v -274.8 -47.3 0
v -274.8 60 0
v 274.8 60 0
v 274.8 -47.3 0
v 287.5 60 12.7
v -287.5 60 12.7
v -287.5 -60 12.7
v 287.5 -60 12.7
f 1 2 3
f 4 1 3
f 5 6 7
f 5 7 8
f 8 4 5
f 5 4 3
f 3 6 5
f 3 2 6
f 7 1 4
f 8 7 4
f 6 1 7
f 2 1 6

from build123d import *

# Parameters (mm, degrees)
SKETCH1_W           = 575
SKETCH1_H           = 120
BOSS_EXTRUDE1_DEPTH = 12.7
CHAMFER1_SIZE       = 12.7


with BuildPart() as part:
    # Sketch1 → Boss-Extrude1 (new body)
    with BuildSketch(Plane.XY):
        Rectangle(SKETCH1_W, SKETCH1_H)
    extrude(amount=BOSS_EXTRUDE1_DEPTH)

    # Chamfer1
    chamfer1_edges = [part.edges().sort_by_distance(p)[0] for p in [
        (287.5, 0, 0),
        (0, -60, 0),
        (-287.5, 0, 0),
    ]]
    chamfer(chamfer1_edges, length=CHAMFER1_SIZE - 0.0001)  # a hair under: the kernel refuses the full size


solid = part.part
